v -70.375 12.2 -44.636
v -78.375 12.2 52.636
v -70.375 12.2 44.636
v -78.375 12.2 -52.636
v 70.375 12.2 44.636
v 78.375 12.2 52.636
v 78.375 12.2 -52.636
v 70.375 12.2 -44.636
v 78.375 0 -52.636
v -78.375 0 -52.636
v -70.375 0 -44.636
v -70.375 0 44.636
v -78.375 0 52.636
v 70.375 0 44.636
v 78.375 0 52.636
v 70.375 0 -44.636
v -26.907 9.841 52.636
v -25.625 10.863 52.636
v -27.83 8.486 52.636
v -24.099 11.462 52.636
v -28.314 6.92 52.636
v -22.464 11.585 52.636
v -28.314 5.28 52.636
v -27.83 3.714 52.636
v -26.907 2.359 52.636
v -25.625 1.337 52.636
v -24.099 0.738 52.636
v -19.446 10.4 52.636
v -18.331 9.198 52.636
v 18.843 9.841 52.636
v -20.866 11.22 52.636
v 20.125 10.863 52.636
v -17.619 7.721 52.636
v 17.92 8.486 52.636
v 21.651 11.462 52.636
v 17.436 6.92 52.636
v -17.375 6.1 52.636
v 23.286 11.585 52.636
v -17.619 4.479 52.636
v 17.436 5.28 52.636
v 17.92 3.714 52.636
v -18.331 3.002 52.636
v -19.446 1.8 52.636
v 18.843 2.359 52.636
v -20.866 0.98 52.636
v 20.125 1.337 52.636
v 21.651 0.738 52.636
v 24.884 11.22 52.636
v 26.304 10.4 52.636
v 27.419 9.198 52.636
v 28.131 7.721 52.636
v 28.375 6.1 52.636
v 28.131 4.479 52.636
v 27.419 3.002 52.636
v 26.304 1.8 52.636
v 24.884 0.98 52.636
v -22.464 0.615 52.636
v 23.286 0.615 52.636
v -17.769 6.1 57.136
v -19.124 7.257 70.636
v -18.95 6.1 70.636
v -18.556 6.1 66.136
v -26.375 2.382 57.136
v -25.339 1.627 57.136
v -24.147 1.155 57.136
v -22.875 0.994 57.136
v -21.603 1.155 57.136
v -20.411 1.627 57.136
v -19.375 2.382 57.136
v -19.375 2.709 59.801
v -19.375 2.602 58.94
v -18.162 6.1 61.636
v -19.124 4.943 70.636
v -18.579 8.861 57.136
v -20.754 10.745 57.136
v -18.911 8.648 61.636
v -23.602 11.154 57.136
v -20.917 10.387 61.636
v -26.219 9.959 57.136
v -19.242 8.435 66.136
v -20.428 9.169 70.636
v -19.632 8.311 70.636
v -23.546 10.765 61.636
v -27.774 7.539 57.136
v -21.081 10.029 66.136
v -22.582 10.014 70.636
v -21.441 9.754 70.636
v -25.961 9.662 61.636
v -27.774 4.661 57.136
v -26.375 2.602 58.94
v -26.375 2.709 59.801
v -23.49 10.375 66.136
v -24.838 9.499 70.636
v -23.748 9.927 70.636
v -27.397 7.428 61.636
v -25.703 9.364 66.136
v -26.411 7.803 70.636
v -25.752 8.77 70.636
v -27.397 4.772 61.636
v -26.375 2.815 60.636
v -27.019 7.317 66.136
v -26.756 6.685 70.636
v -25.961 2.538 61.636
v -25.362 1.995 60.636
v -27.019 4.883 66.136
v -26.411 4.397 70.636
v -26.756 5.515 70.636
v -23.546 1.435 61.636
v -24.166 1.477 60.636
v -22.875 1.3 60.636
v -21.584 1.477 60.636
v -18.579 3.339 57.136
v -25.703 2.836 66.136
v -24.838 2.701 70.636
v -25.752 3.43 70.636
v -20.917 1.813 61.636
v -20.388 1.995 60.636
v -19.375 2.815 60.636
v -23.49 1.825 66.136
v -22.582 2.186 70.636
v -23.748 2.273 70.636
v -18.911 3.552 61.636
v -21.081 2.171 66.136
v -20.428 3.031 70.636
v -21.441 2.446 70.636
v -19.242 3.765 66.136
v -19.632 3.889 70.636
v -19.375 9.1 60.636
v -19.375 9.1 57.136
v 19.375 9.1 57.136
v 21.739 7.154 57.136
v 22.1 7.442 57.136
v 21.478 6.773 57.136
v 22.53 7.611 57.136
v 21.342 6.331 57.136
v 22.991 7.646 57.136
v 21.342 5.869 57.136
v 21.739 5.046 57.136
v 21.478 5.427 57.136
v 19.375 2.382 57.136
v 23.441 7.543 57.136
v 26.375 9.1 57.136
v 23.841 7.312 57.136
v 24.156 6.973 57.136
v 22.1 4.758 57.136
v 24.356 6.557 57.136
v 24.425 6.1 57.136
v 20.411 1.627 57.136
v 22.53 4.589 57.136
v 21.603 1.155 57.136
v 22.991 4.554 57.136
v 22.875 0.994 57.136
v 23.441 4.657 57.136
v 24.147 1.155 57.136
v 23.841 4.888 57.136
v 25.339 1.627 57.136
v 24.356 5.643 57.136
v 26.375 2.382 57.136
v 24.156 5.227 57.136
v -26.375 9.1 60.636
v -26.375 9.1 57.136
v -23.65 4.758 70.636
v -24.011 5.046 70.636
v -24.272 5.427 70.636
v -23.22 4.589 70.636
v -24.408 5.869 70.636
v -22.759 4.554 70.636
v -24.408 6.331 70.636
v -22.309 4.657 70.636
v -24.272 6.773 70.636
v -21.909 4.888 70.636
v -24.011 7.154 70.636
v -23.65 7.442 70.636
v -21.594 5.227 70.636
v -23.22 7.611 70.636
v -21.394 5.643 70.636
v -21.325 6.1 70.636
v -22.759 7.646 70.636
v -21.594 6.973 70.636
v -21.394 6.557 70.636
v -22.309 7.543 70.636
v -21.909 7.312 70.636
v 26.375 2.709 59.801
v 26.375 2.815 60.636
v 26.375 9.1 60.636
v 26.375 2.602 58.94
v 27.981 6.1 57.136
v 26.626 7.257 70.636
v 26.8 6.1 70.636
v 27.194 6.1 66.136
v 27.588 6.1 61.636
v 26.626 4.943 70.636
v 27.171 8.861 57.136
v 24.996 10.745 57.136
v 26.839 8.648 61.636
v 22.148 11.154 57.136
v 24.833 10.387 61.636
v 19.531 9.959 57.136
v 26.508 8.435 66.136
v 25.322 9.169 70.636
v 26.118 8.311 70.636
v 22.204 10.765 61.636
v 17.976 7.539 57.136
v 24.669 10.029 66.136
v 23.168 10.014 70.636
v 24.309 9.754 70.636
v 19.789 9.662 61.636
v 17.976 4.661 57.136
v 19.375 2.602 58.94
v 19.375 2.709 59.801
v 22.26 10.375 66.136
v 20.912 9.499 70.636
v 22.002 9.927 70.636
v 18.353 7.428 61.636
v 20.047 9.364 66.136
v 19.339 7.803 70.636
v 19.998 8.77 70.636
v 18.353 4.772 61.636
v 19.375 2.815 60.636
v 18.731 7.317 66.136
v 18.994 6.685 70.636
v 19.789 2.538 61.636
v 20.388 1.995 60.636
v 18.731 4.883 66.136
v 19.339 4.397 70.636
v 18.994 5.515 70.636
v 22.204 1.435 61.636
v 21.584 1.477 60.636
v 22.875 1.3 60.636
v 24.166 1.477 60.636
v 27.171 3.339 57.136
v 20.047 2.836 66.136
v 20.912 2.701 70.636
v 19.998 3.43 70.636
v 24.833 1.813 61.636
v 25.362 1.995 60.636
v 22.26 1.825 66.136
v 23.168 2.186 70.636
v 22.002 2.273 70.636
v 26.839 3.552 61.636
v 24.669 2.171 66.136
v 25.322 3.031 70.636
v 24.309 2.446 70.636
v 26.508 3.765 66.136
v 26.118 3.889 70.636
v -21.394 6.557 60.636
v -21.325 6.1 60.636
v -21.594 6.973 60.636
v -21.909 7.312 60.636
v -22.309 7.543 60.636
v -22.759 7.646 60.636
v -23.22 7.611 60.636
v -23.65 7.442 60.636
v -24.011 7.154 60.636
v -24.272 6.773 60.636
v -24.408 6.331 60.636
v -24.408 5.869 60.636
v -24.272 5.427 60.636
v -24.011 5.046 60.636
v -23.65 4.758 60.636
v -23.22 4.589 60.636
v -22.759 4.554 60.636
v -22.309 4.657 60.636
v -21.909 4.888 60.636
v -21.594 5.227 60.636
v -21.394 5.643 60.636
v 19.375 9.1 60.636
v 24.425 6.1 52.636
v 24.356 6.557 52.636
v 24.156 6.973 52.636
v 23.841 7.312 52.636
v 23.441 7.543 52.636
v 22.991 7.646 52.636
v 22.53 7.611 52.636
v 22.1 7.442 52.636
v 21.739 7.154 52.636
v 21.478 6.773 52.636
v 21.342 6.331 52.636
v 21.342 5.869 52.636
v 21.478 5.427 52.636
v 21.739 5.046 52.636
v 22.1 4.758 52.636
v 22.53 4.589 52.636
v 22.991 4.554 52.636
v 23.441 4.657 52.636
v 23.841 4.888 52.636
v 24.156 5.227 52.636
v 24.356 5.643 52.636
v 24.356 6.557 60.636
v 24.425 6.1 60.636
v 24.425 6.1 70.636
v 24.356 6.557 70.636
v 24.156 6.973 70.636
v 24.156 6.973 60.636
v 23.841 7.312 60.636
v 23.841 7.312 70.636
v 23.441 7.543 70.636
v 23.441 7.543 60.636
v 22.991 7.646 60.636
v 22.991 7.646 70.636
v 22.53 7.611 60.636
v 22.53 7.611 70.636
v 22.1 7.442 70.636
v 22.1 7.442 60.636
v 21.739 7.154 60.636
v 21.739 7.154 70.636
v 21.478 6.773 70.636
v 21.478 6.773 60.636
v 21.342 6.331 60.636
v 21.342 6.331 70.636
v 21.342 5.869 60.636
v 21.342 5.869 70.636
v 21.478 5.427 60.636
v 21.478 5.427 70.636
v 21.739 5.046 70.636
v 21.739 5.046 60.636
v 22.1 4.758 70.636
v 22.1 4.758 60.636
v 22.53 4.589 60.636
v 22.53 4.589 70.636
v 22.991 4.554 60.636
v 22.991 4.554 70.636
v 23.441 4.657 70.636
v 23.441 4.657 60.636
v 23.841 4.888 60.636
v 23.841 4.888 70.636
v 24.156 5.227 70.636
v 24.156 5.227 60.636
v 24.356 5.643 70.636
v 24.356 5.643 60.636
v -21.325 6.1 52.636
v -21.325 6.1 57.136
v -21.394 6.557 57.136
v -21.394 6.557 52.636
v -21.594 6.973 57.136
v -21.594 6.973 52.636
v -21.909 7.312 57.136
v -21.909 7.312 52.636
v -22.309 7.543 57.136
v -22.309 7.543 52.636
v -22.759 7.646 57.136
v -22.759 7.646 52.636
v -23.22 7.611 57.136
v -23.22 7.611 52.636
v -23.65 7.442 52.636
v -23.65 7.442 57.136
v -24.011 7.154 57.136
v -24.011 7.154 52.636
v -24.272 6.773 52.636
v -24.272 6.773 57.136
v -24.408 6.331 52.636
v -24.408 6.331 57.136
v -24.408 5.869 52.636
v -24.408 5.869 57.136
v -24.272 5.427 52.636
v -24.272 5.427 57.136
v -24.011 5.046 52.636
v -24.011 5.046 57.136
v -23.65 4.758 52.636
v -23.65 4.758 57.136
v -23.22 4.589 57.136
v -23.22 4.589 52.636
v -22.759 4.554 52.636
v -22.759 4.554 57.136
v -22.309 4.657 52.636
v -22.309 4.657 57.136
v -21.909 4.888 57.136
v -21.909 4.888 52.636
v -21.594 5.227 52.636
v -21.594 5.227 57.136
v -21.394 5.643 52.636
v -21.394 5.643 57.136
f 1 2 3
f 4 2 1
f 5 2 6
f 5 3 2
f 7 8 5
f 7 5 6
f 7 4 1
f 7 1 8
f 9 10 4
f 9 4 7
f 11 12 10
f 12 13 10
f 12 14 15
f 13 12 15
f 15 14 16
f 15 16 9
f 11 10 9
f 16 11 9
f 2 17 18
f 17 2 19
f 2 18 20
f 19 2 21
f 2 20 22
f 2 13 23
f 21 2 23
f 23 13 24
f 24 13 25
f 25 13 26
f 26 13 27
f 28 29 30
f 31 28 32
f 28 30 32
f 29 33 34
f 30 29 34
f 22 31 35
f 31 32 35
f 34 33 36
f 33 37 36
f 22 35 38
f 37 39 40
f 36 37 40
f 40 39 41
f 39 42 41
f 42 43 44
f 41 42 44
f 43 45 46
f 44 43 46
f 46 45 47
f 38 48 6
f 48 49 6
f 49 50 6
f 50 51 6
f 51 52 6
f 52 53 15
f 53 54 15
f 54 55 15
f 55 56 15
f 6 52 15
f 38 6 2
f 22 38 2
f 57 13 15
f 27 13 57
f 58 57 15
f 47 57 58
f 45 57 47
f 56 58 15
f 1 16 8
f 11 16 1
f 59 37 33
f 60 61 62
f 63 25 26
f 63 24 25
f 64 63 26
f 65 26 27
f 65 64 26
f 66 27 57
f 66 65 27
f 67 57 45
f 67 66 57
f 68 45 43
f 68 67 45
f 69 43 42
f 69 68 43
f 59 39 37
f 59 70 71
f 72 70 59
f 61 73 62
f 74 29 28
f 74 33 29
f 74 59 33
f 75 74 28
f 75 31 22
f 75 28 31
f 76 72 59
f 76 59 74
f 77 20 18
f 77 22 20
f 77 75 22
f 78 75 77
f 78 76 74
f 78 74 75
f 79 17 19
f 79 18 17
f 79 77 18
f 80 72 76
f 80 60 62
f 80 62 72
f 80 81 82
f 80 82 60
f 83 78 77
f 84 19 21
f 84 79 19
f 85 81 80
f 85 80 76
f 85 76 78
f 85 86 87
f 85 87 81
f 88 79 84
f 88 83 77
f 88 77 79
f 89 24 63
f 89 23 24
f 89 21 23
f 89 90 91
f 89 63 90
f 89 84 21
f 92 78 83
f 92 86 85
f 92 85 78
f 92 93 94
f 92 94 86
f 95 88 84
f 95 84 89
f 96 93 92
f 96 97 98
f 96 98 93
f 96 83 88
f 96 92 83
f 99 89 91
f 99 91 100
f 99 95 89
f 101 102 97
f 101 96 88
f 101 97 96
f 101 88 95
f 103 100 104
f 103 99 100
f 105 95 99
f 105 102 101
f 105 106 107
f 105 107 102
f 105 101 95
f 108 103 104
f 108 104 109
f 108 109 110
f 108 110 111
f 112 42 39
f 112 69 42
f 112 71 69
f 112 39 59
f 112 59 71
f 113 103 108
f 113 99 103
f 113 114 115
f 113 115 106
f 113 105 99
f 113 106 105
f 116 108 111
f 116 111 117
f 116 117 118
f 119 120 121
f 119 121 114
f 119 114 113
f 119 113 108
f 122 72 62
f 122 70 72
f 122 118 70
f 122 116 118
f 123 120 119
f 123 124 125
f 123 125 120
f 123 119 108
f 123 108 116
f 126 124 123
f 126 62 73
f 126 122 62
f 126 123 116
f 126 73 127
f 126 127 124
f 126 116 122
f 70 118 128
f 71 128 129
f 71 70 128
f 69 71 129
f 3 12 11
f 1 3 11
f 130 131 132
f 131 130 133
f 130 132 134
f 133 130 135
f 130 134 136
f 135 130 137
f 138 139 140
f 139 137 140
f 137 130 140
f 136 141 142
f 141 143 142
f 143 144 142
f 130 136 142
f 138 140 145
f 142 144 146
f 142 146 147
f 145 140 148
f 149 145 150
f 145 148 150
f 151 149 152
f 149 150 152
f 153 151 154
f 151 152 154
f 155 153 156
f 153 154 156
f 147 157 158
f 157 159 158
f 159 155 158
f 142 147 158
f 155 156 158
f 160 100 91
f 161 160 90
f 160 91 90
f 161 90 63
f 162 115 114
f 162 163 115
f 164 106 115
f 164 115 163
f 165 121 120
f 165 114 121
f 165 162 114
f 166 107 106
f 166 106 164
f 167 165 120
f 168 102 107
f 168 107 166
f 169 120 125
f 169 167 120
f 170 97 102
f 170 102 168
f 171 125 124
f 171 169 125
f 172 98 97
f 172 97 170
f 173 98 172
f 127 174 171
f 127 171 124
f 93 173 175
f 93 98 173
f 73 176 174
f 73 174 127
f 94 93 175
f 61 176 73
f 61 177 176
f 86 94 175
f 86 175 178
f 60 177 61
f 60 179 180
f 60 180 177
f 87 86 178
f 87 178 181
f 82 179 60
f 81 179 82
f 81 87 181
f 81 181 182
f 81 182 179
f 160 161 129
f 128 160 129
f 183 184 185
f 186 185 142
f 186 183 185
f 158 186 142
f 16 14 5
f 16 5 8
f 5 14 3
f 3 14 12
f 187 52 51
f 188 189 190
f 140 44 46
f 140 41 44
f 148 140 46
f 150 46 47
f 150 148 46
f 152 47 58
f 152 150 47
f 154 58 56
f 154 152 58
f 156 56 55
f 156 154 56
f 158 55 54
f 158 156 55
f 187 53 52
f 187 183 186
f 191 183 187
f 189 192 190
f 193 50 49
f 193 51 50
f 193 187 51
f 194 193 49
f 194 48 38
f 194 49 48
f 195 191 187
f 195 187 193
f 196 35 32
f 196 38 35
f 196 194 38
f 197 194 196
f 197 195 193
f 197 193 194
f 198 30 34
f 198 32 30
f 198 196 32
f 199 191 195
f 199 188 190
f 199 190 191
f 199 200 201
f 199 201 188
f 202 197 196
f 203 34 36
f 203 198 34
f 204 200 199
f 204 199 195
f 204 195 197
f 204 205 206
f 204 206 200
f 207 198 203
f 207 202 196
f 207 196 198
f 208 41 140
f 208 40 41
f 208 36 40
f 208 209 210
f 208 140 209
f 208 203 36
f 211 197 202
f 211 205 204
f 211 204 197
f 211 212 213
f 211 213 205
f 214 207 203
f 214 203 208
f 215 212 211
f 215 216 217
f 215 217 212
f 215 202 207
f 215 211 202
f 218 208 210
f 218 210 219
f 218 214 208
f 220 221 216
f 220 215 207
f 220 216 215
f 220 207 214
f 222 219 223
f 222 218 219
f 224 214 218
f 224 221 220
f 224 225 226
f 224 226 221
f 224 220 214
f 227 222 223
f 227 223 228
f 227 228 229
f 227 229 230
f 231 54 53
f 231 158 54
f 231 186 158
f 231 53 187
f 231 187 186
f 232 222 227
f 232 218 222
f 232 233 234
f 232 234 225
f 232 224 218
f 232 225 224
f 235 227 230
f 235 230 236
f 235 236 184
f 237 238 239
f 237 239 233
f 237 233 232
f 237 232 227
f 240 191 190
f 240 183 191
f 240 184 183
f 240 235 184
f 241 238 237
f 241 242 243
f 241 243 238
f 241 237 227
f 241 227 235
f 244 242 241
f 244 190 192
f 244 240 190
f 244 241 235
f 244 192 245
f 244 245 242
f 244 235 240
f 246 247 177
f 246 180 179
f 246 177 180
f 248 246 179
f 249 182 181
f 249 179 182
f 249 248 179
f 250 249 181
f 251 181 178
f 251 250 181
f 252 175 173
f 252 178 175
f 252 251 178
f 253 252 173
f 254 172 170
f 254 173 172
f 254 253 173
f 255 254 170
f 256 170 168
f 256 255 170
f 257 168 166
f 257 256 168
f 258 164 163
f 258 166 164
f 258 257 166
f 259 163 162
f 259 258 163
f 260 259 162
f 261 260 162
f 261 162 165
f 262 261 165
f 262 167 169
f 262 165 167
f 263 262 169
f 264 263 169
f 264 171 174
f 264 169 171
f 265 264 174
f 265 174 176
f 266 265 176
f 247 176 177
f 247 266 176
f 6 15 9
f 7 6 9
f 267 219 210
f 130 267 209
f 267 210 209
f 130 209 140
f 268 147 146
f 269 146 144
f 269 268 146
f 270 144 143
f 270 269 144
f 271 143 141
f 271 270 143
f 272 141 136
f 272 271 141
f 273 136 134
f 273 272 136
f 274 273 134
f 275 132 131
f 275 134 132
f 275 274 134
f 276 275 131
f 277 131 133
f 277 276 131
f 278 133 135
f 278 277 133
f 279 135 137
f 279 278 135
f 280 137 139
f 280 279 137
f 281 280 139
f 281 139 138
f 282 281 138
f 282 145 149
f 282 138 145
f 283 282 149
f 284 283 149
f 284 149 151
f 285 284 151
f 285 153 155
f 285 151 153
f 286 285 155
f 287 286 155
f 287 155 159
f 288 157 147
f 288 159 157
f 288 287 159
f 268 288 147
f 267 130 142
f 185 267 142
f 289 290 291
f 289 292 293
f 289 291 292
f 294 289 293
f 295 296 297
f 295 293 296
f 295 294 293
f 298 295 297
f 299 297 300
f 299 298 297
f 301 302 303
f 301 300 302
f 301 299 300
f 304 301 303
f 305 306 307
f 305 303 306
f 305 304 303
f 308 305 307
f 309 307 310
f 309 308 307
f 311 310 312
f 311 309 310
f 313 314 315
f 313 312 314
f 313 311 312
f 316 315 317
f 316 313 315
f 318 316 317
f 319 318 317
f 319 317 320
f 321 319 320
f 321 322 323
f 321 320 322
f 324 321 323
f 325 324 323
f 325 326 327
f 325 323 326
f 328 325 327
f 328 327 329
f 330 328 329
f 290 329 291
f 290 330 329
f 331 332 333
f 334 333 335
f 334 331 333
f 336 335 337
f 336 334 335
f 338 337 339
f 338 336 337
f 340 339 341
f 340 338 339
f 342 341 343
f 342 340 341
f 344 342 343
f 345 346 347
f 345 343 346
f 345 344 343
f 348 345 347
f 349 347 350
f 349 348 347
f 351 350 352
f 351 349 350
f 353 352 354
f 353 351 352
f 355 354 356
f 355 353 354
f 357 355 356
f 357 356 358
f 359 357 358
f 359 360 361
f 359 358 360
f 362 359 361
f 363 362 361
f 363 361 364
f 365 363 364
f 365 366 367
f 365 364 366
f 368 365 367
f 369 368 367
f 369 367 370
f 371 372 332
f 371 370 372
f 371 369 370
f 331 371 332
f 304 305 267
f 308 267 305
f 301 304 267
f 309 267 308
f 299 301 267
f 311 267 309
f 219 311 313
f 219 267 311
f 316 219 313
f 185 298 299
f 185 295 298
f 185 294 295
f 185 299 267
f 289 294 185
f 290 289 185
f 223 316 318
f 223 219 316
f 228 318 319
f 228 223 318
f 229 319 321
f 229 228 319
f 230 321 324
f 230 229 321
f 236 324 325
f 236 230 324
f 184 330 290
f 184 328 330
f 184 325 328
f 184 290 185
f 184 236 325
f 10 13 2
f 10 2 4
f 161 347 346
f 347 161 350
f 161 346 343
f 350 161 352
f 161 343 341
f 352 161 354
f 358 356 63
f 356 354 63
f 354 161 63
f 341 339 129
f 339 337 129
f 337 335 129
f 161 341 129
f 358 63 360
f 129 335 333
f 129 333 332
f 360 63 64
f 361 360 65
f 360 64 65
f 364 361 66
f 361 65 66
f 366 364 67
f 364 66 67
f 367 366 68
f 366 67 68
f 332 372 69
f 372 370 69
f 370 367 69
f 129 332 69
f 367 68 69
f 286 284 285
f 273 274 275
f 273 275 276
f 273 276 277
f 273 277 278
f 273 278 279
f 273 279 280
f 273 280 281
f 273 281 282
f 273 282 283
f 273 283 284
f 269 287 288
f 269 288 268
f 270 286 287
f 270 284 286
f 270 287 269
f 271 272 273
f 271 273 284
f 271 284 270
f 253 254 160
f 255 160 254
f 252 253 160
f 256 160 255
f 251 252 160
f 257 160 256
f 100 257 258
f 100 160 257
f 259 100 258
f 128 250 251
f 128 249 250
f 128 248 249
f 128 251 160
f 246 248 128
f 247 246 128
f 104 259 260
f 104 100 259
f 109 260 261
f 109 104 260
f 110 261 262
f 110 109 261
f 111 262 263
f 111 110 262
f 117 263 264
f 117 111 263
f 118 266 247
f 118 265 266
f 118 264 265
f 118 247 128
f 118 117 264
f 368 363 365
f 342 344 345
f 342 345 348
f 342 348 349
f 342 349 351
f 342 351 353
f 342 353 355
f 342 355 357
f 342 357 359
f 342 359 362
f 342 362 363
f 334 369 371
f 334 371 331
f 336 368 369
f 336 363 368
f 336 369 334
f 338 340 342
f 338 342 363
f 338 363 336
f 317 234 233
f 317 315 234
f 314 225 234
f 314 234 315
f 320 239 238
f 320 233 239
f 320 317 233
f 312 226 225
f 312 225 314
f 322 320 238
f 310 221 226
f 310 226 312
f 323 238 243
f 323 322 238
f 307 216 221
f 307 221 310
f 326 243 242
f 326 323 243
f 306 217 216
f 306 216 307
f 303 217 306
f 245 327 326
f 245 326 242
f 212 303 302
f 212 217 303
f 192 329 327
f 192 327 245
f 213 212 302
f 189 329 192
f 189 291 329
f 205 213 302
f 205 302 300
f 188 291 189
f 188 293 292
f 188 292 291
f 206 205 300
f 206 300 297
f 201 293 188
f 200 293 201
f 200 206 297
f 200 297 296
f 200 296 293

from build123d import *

# Parameters (mm, degrees)
SKETCH_1_W          = 156.75
SKETCH_1_H          = 105.271994628
EXTRUDE_1_DEPTH     = 12.2
SKETCH_2_W          = 7.639581741
SKETCH_2_H          = 13.89014237
CUT_EXTRUDE_1_DEPTH = 6.1
SKETCH_4_R          = 5.5
EXTRUDE_2_DEPTH     = 18
EXTRUDE_2_TAPER     = 5
CUT_EXTRUDE_2_REACH = 20
SKETCH_6_R          = 1.55
SKETCH_7_W          = 7
SKETCH_7_H          = 3.5
CUT_EXTRUDE_3_DEPTH = 9.1
SKETCH_8_W          = 140.75
SKETCH_8_H          = 89.271994628
CUT_EXTRUDE_4_DEPTH = 13.2


with BuildPart() as part:
    # ｽｹｯﾁ1 → ﾎﾞｽ - 押し出し1 (new body)
    with BuildSketch(Plane(origin=(0, 0, 0), x_dir=(1, 0, 0), z_dir=(0, 1, 0))):
        Rectangle(SKETCH_1_W, SKETCH_1_H)
    extrude(amount=EXTRUDE_1_DEPTH)

    # ｽｹｯﾁ2 → ｶｯﾄ - 押し出し1 (cut)
    with BuildSketch(Plane(origin=(0, 12.2, 0), x_dir=(1, 0, 0), z_dir=(0, 1, 0))):
        with BuildLine():
            ThreePointArc((-44.016, 13.890145056), (-40.196209129, 16.500447871), (-36.376418259, 13.890145056))
            Line((-36.376418259, 13.890145056), (-44.016, 13.890145056))
        make_face()
        with Locations((-40.19620913, 6.945073871)):
            Rectangle(SKETCH_2_W, SKETCH_2_H)
        with BuildLine():
            Line((-44.016, 2.686e-06), (-36.376418259, 2.686e-06))
            ThreePointArc((-36.376418259, 2.686e-06), (-40.196209129, -2.610300128), (-44.016, 2.686e-06))
        make_face()
        with BuildLine():
            Line((44.016, 13.890145056), (36.376418259, 13.890145056))
            ThreePointArc((36.376418259, 13.890145056), (40.196209129, 16.500447871), (44.016, 13.890145056))
        make_face()
        with Locations((40.19620913, 6.945073871)):
            Rectangle(SKETCH_2_W, SKETCH_2_H)
        with BuildLine():
            ThreePointArc((44.016, 2.686e-06), (40.196209129, -2.610300128), (36.376418259, 2.686e-06))
            Line((36.376418259, 2.686e-06), (44.016, 2.686e-06))
        make_face()
    extrude(amount=-CUT_EXTRUDE_1_DEPTH, mode=Mode.SUBTRACT)

    # ｽｹｯﾁ4 → ﾎﾞｽ - 押し出し2 (add)
    with BuildSketch(Plane.XY.offset(52.635997314)):
        with Locations((-22.875, 6.1)):
            Circle(SKETCH_4_R)
        with Locations((22.875, 6.1)):
            Circle(SKETCH_4_R)
    extrude(amount=EXTRUDE_2_DEPTH, taper=EXTRUDE_2_TAPER)

    # ｽｹｯﾁ6 → ｶｯﾄ - 押し出し2 (cut, up to next)
    with BuildSketch(Plane.XY.offset(52.635997314), mode=Mode.PRIVATE) as cut_extrude_2_sk1:
        with Locations((-22.875, 6.1)):
            Circle(SKETCH_6_R)
    cut_extrude_2_tool1 = extrude(cut_extrude_2_sk1.sketch, amount=CUT_EXTRUDE_2_REACH, mode=Mode.PRIVATE) & part.part
    add(cut_extrude_2_tool1.solids().sort_by_distance((-22.875, 6.1, 52.635997))[0], mode=Mode.SUBTRACT)
    # ｽｹｯﾁ6 → ｶｯﾄ - 押し出し2 (cut, up to next)
    with BuildSketch(Plane.XY.offset(52.635997314), mode=Mode.PRIVATE) as cut_extrude_2_sk2:
        with Locations((22.875, 6.1)):
            Circle(SKETCH_6_R)
    cut_extrude_2_tool2 = extrude(cut_extrude_2_sk2.sketch, amount=CUT_EXTRUDE_2_REACH, mode=Mode.PRIVATE) & part.part
    add(cut_extrude_2_tool2.solids().sort_by_distance((22.875, 6.1, 52.635997))[0], mode=Mode.SUBTRACT)

    # ｽｹｯﾁ7 → ｶｯﾄ - 押し出し3 (cut)
    with BuildSketch(Plane(origin=(0, 0, 0), x_dir=(1, 0, 0), z_dir=(0, 1, 0))):
        with Locations((-22.875, -58.885997314)):
            Rectangle(SKETCH_7_W, SKETCH_7_H)
        with Locations((22.875, -58.885997314)):
            Rectangle(SKETCH_7_W, SKETCH_7_H)
    extrude(amount=CUT_EXTRUDE_3_DEPTH, mode=Mode.SUBTRACT)

    # ｽｹｯﾁ8 → ｶｯﾄ - 押し出し4 (cut, through all)
    with BuildSketch(Plane(origin=(0, 0, 0), x_dir=(-1, 0, 0), z_dir=(0, -1, 0))):
        Rectangle(SKETCH_8_W, SKETCH_8_H)
    extrude(amount=-CUT_EXTRUDE_4_DEPTH, mode=Mode.SUBTRACT)


solid = part.part
